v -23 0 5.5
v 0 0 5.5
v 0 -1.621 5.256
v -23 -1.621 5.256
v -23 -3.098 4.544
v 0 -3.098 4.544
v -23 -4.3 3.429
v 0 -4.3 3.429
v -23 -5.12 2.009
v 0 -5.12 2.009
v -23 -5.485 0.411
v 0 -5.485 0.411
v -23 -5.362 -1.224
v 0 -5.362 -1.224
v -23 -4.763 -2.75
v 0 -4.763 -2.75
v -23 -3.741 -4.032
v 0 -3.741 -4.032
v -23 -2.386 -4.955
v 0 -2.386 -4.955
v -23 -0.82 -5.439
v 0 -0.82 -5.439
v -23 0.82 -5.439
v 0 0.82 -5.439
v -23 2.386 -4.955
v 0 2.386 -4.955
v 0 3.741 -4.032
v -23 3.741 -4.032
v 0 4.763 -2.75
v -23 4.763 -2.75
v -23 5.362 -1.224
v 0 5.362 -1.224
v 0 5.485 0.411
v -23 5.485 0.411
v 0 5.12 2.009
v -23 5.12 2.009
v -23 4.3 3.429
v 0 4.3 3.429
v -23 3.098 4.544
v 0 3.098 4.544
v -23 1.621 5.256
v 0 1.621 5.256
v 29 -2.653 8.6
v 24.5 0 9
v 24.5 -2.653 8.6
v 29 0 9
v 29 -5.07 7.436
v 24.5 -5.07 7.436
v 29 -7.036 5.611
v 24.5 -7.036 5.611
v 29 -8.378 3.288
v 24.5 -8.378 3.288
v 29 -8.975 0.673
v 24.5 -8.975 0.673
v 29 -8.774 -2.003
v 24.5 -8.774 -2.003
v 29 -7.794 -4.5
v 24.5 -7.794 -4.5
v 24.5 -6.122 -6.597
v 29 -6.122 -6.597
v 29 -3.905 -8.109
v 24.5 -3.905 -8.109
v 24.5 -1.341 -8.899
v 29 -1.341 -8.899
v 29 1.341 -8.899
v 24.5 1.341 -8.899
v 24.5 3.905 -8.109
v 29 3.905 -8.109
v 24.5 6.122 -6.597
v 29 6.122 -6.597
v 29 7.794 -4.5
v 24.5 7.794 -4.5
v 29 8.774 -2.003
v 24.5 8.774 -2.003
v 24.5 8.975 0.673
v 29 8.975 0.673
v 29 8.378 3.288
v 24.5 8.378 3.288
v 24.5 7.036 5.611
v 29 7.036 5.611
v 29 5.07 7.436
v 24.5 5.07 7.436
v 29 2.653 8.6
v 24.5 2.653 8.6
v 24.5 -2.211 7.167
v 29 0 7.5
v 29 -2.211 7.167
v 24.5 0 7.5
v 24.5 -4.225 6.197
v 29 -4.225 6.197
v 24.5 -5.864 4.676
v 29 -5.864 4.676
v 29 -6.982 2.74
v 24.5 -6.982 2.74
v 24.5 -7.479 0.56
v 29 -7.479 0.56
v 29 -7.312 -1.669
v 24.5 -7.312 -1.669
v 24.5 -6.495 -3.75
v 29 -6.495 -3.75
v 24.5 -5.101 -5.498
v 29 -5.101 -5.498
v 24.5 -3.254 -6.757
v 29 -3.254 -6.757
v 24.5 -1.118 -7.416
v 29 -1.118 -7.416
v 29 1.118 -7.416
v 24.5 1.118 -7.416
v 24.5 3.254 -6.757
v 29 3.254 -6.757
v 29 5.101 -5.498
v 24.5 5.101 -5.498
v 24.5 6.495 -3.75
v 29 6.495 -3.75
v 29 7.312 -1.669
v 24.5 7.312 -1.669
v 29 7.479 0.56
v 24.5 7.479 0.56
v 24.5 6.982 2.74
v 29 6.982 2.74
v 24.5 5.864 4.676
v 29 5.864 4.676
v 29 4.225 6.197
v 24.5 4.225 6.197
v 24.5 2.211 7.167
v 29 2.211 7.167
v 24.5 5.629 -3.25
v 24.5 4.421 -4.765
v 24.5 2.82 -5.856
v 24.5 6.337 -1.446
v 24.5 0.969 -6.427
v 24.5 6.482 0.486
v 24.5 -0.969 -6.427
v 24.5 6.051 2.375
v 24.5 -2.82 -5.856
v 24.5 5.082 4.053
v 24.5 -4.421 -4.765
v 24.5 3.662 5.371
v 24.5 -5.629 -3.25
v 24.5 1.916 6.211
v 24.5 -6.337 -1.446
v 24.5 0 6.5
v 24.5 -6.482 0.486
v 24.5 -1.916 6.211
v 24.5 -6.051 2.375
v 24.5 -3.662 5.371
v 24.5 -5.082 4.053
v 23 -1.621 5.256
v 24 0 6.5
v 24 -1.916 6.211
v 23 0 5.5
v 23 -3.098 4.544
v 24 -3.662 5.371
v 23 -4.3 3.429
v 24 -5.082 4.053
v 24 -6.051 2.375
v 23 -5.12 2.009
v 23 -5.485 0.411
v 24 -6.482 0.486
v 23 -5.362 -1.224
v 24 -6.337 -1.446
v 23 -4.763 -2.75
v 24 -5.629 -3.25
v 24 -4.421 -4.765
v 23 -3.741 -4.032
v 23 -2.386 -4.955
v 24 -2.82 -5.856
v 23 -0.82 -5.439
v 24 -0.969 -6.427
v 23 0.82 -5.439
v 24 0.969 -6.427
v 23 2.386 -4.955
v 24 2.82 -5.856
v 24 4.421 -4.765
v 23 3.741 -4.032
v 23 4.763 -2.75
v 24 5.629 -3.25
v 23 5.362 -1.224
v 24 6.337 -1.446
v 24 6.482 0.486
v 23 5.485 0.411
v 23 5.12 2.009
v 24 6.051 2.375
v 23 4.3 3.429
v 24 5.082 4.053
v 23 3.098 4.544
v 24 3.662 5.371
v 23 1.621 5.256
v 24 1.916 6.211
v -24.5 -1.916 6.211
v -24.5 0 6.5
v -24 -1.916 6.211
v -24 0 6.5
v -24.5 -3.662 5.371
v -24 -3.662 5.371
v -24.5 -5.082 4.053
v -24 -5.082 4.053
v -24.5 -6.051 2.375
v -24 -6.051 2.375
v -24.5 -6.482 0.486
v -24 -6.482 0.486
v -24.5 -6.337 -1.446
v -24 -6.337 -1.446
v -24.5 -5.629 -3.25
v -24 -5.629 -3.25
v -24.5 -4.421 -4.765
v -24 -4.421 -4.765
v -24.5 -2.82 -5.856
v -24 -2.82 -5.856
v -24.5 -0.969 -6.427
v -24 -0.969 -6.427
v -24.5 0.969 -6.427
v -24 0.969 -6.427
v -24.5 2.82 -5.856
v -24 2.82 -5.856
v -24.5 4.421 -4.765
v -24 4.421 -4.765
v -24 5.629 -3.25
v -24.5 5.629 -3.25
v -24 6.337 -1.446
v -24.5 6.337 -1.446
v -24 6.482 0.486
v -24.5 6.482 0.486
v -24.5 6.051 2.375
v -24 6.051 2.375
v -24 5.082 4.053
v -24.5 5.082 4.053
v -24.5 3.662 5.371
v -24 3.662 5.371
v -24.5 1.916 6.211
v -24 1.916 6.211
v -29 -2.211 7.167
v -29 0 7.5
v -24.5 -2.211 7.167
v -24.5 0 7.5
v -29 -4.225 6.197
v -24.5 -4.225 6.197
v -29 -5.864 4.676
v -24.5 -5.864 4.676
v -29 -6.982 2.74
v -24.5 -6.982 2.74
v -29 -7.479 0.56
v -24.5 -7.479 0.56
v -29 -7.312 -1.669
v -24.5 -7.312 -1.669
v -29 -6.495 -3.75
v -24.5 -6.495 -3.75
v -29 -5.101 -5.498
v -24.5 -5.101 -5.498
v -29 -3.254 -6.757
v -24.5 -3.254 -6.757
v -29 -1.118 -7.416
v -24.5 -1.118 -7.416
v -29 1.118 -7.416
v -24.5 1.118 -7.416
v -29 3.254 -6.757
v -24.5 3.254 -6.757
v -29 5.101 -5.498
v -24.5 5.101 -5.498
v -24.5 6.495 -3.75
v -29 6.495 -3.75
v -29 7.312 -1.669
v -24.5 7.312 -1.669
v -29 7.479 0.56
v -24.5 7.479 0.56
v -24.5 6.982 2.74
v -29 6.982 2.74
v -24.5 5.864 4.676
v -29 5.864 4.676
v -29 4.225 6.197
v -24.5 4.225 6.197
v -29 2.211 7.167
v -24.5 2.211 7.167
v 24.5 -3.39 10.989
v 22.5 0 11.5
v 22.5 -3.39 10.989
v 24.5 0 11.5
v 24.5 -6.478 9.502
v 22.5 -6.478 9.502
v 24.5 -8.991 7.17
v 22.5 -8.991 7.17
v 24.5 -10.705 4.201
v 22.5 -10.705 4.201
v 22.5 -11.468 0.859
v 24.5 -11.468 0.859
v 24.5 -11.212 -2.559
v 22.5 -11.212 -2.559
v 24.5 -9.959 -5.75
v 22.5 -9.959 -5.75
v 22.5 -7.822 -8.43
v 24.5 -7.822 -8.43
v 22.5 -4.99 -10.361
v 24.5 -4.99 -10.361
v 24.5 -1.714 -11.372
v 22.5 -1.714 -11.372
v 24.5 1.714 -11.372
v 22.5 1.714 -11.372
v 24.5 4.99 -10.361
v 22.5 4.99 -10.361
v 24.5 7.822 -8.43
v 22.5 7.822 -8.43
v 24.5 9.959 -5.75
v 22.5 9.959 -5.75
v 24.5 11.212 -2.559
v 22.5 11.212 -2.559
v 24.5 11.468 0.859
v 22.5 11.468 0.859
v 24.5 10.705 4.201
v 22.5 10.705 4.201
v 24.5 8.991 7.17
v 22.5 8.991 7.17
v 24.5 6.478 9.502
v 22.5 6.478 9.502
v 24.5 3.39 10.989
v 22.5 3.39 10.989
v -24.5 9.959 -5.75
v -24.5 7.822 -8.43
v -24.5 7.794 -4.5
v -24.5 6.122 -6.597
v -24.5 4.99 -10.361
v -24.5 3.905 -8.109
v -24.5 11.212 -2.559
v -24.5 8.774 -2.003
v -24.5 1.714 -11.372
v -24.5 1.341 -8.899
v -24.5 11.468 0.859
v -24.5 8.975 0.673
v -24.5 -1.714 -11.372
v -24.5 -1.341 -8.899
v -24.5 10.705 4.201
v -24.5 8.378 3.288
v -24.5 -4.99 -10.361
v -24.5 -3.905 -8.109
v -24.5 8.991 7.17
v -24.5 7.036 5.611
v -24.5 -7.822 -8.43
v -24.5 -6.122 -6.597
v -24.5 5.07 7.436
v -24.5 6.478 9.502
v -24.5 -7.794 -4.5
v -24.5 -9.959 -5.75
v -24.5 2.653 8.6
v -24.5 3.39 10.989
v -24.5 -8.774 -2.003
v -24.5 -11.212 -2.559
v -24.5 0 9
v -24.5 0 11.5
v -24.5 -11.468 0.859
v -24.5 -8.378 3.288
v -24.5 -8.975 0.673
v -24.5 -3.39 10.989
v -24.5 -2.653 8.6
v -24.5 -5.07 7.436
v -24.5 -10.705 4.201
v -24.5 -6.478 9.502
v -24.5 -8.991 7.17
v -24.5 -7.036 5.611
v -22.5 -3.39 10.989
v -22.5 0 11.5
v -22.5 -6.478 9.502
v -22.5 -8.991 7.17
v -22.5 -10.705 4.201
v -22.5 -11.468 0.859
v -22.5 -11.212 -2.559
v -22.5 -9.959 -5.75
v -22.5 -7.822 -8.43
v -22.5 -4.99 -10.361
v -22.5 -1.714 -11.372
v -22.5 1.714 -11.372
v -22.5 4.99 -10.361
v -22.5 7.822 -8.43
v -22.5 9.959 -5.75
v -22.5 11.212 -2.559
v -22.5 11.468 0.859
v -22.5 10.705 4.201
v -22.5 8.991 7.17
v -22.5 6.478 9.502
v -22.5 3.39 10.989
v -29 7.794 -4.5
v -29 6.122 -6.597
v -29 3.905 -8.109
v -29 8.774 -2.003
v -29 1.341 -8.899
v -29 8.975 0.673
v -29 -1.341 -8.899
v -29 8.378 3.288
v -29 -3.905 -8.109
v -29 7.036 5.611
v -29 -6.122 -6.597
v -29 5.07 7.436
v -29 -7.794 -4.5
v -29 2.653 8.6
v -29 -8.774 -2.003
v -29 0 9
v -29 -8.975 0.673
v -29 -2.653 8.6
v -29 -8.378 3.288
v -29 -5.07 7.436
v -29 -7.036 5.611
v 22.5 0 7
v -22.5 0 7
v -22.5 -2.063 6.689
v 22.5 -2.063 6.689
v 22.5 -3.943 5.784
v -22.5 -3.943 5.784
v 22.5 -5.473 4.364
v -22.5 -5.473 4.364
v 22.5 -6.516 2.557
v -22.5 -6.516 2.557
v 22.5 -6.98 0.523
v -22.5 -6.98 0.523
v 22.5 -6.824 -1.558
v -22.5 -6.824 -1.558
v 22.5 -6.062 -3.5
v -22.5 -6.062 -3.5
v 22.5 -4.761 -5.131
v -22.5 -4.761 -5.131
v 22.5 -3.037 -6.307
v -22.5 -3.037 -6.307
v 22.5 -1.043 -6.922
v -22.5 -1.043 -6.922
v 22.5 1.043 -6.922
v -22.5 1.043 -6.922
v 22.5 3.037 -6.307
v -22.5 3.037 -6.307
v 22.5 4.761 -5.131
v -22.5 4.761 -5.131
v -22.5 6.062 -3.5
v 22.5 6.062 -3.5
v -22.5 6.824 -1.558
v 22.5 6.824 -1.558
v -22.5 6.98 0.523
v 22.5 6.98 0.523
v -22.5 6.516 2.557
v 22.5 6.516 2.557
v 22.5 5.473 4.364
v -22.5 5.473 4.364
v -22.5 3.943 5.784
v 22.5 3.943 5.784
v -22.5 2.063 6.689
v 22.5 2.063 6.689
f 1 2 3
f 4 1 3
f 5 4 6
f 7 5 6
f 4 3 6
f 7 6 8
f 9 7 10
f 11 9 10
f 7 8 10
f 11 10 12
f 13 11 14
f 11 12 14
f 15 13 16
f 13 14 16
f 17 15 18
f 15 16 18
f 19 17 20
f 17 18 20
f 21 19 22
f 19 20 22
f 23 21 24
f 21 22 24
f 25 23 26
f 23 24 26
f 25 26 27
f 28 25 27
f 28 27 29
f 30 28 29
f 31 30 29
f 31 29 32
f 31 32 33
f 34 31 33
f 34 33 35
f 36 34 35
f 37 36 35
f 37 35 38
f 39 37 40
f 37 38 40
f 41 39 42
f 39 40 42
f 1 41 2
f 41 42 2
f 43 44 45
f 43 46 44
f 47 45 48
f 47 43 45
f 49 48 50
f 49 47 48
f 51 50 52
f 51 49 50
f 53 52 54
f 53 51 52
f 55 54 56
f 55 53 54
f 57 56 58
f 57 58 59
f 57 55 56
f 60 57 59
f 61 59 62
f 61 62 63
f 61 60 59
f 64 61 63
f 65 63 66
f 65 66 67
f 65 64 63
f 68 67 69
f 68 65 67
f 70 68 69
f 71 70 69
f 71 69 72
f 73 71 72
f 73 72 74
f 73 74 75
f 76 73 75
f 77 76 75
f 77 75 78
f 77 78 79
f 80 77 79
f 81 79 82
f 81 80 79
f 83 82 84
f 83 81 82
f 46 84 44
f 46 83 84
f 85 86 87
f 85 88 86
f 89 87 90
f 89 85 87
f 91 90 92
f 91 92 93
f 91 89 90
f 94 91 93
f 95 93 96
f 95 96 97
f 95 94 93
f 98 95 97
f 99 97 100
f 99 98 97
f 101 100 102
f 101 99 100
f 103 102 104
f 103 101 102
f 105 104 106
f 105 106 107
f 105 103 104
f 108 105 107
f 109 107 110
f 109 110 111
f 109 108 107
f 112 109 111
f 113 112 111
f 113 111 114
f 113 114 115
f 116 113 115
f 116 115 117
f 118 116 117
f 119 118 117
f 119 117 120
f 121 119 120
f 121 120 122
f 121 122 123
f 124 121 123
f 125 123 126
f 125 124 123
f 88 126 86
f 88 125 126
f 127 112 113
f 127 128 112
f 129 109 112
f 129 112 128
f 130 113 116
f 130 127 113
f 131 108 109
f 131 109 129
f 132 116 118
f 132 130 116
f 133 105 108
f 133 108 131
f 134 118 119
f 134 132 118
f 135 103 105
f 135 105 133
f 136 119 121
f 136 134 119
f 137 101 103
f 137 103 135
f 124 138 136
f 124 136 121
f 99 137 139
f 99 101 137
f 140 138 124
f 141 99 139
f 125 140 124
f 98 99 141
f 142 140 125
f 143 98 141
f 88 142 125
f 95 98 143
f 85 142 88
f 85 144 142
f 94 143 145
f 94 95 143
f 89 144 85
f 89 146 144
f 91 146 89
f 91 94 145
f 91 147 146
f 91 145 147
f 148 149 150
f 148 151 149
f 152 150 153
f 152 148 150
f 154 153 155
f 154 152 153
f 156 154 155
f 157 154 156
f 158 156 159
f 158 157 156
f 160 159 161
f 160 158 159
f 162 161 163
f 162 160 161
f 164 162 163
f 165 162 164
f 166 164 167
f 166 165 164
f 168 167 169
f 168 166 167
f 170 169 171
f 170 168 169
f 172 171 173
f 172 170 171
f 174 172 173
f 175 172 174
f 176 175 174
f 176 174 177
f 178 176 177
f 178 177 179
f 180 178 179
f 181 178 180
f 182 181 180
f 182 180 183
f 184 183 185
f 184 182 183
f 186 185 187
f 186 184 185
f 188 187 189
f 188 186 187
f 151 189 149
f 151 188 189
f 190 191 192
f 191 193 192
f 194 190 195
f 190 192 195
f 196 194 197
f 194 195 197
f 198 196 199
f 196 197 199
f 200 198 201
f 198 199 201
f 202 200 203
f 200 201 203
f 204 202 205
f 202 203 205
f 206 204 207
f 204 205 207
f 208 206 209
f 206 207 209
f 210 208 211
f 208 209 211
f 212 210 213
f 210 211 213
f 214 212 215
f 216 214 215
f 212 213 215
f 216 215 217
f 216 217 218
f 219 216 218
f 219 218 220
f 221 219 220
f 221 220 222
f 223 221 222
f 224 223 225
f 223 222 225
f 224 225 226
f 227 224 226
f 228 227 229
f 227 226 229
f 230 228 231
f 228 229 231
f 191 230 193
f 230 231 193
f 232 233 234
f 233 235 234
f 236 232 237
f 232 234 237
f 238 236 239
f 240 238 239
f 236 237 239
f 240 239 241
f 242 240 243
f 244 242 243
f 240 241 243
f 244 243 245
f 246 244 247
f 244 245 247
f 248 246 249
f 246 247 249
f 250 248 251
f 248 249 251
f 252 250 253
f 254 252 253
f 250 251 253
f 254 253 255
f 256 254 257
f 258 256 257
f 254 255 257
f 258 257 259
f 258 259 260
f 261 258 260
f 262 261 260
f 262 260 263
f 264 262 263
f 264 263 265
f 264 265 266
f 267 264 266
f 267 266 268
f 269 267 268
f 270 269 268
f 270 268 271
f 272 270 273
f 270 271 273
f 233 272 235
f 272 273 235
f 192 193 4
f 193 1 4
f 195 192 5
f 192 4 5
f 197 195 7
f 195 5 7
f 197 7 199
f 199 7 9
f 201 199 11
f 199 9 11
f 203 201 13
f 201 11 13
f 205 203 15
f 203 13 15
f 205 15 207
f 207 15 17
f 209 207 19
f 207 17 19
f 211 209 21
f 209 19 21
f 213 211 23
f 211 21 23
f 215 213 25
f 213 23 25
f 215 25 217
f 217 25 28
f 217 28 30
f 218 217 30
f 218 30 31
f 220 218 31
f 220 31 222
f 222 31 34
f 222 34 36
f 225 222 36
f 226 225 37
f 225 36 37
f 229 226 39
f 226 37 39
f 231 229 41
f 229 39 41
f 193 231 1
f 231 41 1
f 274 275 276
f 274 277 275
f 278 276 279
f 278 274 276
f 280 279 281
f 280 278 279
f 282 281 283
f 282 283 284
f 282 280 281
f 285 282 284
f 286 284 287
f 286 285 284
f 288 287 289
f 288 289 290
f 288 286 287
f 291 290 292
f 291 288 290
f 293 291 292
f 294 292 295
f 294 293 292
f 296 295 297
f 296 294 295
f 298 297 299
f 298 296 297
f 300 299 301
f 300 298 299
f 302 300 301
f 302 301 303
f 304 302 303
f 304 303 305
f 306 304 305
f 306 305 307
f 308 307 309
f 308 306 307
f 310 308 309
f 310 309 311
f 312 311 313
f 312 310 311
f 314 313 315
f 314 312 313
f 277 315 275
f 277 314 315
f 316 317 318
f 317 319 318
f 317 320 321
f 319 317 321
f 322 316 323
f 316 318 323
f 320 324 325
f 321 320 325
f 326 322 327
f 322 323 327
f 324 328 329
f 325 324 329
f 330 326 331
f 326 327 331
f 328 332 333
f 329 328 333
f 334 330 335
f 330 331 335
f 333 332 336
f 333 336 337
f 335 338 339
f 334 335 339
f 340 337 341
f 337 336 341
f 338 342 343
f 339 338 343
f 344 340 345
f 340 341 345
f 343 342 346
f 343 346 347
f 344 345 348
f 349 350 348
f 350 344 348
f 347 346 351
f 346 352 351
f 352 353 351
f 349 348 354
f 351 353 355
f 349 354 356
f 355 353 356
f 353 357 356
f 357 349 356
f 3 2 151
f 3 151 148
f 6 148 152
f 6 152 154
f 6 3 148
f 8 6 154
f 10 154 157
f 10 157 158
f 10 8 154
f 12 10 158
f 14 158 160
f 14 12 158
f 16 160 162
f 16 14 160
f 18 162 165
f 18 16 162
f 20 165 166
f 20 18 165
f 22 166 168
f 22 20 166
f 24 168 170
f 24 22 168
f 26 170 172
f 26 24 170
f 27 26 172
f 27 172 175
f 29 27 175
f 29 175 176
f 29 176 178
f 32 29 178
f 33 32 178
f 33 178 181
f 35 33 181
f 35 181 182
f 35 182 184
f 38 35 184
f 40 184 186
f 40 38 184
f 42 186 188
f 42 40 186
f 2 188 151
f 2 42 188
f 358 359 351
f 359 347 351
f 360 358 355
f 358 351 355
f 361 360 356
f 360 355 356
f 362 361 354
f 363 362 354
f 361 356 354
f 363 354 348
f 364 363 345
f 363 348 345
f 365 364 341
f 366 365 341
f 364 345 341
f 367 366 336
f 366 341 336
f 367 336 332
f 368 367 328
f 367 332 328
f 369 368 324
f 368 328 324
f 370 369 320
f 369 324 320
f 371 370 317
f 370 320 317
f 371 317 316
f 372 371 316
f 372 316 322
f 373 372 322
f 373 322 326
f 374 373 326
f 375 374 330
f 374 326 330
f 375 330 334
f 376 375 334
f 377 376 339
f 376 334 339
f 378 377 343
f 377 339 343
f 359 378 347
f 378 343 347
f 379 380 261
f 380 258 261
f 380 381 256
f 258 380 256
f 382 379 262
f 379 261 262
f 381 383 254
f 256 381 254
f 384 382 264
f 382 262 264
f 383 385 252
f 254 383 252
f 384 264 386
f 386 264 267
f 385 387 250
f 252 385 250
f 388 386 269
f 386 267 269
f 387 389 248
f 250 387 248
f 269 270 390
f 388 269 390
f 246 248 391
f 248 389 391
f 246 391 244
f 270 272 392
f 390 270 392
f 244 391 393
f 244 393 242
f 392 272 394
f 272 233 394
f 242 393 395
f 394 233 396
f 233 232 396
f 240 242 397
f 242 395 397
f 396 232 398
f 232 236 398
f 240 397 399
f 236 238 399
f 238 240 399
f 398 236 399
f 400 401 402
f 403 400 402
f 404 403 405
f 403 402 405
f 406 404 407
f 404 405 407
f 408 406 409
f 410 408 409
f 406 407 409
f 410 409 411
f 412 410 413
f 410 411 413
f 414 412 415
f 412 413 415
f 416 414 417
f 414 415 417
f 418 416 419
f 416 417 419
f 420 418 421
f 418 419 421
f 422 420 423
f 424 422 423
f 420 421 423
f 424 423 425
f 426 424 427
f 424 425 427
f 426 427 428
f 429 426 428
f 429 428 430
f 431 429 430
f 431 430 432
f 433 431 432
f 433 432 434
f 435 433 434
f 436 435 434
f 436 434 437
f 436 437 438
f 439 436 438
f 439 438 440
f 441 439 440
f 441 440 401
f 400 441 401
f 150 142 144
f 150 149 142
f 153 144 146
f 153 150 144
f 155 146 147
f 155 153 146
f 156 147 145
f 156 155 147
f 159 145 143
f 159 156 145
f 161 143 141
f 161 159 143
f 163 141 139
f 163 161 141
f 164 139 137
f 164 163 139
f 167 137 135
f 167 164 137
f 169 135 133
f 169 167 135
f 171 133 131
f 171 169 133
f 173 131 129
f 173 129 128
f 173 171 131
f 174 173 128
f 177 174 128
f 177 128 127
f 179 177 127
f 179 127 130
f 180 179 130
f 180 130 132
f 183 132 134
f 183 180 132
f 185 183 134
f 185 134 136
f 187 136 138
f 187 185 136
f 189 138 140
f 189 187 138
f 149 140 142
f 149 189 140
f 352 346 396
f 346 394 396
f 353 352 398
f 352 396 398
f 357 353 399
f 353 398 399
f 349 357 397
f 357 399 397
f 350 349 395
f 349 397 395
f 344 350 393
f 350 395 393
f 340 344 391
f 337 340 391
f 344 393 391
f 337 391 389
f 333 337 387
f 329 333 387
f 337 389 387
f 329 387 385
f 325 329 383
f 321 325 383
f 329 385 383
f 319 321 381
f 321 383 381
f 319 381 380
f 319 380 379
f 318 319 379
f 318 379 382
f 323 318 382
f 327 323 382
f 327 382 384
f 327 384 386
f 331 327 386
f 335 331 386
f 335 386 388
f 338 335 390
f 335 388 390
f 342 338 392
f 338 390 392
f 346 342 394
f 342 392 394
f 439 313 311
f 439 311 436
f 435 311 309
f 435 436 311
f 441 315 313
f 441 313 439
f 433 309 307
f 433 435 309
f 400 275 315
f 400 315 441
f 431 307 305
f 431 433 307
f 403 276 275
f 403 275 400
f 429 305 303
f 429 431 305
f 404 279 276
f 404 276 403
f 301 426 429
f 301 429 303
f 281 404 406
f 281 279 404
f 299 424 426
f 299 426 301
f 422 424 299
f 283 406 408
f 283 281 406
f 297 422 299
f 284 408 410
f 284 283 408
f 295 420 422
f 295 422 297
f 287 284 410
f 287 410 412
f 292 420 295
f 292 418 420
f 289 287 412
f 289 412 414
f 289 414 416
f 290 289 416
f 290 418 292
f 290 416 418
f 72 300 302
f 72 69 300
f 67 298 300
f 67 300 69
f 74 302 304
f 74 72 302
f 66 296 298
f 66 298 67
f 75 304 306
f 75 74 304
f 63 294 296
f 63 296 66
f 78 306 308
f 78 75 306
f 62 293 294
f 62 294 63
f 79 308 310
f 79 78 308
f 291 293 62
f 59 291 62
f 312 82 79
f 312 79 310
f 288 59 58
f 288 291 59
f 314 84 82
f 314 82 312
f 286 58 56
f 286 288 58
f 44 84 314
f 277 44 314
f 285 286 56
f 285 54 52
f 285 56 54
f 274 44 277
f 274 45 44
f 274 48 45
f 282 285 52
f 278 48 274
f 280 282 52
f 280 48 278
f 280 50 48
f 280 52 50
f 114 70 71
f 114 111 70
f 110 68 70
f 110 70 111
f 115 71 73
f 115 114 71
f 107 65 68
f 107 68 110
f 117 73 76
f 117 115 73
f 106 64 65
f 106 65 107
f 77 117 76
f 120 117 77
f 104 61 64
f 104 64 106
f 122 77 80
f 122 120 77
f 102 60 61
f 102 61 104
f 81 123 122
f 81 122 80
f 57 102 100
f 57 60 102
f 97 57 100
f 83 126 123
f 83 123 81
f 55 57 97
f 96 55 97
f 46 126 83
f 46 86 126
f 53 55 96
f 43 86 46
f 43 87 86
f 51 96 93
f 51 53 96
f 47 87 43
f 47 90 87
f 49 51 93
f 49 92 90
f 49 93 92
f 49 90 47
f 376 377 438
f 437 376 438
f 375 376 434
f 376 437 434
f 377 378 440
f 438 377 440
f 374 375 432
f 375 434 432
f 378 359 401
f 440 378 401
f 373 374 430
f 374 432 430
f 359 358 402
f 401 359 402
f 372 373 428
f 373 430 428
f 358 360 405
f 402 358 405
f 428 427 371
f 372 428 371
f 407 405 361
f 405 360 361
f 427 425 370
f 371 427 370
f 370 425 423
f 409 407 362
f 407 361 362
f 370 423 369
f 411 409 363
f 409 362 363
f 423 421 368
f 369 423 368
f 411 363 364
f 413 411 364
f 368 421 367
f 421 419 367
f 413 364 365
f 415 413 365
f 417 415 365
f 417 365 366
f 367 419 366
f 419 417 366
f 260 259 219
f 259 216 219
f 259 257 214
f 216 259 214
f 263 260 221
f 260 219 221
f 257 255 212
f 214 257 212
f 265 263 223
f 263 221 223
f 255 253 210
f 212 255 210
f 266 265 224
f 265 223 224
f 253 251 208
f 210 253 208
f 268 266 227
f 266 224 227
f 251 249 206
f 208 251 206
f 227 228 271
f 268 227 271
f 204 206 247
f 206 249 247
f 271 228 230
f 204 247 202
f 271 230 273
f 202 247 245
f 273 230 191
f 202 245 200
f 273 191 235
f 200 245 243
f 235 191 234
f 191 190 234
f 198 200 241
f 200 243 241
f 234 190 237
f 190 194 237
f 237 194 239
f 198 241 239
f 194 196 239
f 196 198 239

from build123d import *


with BuildPart() as part:
    # 草图1 → 旋转1 (revolve)
    with BuildSketch(Plane(origin=(0, 0, 0), x_dir=(1, 0, 0), z_dir=(0, 1, 0)), mode=Mode.PRIVATE) as revolve_1_sk:
        Polygon((0, 7), (22.5, 7), (22.5, 11.5), (24.5, 11.5), (24.5, 9), (29, 9), (29, 7.5), (24.5, 7.5), (24.5, 6.5), (24, 6.5), (23, 5.5), (0, 5.5), align=None)
    revolve_1 = revolve(revolve_1_sk.sketch.rotate(Axis((0, 0, 0), (1, 0, 0)), 180), axis=Axis((0, 0, 0), (1, 0, 0)))

    # 镜向1: 旋转1 across plane
    add(revolve_1.mirror(Plane(origin=(0, 0, -5.5), x_dir=(0, 0, 1), z_dir=(1, 0, 0))))


solid = part.part
